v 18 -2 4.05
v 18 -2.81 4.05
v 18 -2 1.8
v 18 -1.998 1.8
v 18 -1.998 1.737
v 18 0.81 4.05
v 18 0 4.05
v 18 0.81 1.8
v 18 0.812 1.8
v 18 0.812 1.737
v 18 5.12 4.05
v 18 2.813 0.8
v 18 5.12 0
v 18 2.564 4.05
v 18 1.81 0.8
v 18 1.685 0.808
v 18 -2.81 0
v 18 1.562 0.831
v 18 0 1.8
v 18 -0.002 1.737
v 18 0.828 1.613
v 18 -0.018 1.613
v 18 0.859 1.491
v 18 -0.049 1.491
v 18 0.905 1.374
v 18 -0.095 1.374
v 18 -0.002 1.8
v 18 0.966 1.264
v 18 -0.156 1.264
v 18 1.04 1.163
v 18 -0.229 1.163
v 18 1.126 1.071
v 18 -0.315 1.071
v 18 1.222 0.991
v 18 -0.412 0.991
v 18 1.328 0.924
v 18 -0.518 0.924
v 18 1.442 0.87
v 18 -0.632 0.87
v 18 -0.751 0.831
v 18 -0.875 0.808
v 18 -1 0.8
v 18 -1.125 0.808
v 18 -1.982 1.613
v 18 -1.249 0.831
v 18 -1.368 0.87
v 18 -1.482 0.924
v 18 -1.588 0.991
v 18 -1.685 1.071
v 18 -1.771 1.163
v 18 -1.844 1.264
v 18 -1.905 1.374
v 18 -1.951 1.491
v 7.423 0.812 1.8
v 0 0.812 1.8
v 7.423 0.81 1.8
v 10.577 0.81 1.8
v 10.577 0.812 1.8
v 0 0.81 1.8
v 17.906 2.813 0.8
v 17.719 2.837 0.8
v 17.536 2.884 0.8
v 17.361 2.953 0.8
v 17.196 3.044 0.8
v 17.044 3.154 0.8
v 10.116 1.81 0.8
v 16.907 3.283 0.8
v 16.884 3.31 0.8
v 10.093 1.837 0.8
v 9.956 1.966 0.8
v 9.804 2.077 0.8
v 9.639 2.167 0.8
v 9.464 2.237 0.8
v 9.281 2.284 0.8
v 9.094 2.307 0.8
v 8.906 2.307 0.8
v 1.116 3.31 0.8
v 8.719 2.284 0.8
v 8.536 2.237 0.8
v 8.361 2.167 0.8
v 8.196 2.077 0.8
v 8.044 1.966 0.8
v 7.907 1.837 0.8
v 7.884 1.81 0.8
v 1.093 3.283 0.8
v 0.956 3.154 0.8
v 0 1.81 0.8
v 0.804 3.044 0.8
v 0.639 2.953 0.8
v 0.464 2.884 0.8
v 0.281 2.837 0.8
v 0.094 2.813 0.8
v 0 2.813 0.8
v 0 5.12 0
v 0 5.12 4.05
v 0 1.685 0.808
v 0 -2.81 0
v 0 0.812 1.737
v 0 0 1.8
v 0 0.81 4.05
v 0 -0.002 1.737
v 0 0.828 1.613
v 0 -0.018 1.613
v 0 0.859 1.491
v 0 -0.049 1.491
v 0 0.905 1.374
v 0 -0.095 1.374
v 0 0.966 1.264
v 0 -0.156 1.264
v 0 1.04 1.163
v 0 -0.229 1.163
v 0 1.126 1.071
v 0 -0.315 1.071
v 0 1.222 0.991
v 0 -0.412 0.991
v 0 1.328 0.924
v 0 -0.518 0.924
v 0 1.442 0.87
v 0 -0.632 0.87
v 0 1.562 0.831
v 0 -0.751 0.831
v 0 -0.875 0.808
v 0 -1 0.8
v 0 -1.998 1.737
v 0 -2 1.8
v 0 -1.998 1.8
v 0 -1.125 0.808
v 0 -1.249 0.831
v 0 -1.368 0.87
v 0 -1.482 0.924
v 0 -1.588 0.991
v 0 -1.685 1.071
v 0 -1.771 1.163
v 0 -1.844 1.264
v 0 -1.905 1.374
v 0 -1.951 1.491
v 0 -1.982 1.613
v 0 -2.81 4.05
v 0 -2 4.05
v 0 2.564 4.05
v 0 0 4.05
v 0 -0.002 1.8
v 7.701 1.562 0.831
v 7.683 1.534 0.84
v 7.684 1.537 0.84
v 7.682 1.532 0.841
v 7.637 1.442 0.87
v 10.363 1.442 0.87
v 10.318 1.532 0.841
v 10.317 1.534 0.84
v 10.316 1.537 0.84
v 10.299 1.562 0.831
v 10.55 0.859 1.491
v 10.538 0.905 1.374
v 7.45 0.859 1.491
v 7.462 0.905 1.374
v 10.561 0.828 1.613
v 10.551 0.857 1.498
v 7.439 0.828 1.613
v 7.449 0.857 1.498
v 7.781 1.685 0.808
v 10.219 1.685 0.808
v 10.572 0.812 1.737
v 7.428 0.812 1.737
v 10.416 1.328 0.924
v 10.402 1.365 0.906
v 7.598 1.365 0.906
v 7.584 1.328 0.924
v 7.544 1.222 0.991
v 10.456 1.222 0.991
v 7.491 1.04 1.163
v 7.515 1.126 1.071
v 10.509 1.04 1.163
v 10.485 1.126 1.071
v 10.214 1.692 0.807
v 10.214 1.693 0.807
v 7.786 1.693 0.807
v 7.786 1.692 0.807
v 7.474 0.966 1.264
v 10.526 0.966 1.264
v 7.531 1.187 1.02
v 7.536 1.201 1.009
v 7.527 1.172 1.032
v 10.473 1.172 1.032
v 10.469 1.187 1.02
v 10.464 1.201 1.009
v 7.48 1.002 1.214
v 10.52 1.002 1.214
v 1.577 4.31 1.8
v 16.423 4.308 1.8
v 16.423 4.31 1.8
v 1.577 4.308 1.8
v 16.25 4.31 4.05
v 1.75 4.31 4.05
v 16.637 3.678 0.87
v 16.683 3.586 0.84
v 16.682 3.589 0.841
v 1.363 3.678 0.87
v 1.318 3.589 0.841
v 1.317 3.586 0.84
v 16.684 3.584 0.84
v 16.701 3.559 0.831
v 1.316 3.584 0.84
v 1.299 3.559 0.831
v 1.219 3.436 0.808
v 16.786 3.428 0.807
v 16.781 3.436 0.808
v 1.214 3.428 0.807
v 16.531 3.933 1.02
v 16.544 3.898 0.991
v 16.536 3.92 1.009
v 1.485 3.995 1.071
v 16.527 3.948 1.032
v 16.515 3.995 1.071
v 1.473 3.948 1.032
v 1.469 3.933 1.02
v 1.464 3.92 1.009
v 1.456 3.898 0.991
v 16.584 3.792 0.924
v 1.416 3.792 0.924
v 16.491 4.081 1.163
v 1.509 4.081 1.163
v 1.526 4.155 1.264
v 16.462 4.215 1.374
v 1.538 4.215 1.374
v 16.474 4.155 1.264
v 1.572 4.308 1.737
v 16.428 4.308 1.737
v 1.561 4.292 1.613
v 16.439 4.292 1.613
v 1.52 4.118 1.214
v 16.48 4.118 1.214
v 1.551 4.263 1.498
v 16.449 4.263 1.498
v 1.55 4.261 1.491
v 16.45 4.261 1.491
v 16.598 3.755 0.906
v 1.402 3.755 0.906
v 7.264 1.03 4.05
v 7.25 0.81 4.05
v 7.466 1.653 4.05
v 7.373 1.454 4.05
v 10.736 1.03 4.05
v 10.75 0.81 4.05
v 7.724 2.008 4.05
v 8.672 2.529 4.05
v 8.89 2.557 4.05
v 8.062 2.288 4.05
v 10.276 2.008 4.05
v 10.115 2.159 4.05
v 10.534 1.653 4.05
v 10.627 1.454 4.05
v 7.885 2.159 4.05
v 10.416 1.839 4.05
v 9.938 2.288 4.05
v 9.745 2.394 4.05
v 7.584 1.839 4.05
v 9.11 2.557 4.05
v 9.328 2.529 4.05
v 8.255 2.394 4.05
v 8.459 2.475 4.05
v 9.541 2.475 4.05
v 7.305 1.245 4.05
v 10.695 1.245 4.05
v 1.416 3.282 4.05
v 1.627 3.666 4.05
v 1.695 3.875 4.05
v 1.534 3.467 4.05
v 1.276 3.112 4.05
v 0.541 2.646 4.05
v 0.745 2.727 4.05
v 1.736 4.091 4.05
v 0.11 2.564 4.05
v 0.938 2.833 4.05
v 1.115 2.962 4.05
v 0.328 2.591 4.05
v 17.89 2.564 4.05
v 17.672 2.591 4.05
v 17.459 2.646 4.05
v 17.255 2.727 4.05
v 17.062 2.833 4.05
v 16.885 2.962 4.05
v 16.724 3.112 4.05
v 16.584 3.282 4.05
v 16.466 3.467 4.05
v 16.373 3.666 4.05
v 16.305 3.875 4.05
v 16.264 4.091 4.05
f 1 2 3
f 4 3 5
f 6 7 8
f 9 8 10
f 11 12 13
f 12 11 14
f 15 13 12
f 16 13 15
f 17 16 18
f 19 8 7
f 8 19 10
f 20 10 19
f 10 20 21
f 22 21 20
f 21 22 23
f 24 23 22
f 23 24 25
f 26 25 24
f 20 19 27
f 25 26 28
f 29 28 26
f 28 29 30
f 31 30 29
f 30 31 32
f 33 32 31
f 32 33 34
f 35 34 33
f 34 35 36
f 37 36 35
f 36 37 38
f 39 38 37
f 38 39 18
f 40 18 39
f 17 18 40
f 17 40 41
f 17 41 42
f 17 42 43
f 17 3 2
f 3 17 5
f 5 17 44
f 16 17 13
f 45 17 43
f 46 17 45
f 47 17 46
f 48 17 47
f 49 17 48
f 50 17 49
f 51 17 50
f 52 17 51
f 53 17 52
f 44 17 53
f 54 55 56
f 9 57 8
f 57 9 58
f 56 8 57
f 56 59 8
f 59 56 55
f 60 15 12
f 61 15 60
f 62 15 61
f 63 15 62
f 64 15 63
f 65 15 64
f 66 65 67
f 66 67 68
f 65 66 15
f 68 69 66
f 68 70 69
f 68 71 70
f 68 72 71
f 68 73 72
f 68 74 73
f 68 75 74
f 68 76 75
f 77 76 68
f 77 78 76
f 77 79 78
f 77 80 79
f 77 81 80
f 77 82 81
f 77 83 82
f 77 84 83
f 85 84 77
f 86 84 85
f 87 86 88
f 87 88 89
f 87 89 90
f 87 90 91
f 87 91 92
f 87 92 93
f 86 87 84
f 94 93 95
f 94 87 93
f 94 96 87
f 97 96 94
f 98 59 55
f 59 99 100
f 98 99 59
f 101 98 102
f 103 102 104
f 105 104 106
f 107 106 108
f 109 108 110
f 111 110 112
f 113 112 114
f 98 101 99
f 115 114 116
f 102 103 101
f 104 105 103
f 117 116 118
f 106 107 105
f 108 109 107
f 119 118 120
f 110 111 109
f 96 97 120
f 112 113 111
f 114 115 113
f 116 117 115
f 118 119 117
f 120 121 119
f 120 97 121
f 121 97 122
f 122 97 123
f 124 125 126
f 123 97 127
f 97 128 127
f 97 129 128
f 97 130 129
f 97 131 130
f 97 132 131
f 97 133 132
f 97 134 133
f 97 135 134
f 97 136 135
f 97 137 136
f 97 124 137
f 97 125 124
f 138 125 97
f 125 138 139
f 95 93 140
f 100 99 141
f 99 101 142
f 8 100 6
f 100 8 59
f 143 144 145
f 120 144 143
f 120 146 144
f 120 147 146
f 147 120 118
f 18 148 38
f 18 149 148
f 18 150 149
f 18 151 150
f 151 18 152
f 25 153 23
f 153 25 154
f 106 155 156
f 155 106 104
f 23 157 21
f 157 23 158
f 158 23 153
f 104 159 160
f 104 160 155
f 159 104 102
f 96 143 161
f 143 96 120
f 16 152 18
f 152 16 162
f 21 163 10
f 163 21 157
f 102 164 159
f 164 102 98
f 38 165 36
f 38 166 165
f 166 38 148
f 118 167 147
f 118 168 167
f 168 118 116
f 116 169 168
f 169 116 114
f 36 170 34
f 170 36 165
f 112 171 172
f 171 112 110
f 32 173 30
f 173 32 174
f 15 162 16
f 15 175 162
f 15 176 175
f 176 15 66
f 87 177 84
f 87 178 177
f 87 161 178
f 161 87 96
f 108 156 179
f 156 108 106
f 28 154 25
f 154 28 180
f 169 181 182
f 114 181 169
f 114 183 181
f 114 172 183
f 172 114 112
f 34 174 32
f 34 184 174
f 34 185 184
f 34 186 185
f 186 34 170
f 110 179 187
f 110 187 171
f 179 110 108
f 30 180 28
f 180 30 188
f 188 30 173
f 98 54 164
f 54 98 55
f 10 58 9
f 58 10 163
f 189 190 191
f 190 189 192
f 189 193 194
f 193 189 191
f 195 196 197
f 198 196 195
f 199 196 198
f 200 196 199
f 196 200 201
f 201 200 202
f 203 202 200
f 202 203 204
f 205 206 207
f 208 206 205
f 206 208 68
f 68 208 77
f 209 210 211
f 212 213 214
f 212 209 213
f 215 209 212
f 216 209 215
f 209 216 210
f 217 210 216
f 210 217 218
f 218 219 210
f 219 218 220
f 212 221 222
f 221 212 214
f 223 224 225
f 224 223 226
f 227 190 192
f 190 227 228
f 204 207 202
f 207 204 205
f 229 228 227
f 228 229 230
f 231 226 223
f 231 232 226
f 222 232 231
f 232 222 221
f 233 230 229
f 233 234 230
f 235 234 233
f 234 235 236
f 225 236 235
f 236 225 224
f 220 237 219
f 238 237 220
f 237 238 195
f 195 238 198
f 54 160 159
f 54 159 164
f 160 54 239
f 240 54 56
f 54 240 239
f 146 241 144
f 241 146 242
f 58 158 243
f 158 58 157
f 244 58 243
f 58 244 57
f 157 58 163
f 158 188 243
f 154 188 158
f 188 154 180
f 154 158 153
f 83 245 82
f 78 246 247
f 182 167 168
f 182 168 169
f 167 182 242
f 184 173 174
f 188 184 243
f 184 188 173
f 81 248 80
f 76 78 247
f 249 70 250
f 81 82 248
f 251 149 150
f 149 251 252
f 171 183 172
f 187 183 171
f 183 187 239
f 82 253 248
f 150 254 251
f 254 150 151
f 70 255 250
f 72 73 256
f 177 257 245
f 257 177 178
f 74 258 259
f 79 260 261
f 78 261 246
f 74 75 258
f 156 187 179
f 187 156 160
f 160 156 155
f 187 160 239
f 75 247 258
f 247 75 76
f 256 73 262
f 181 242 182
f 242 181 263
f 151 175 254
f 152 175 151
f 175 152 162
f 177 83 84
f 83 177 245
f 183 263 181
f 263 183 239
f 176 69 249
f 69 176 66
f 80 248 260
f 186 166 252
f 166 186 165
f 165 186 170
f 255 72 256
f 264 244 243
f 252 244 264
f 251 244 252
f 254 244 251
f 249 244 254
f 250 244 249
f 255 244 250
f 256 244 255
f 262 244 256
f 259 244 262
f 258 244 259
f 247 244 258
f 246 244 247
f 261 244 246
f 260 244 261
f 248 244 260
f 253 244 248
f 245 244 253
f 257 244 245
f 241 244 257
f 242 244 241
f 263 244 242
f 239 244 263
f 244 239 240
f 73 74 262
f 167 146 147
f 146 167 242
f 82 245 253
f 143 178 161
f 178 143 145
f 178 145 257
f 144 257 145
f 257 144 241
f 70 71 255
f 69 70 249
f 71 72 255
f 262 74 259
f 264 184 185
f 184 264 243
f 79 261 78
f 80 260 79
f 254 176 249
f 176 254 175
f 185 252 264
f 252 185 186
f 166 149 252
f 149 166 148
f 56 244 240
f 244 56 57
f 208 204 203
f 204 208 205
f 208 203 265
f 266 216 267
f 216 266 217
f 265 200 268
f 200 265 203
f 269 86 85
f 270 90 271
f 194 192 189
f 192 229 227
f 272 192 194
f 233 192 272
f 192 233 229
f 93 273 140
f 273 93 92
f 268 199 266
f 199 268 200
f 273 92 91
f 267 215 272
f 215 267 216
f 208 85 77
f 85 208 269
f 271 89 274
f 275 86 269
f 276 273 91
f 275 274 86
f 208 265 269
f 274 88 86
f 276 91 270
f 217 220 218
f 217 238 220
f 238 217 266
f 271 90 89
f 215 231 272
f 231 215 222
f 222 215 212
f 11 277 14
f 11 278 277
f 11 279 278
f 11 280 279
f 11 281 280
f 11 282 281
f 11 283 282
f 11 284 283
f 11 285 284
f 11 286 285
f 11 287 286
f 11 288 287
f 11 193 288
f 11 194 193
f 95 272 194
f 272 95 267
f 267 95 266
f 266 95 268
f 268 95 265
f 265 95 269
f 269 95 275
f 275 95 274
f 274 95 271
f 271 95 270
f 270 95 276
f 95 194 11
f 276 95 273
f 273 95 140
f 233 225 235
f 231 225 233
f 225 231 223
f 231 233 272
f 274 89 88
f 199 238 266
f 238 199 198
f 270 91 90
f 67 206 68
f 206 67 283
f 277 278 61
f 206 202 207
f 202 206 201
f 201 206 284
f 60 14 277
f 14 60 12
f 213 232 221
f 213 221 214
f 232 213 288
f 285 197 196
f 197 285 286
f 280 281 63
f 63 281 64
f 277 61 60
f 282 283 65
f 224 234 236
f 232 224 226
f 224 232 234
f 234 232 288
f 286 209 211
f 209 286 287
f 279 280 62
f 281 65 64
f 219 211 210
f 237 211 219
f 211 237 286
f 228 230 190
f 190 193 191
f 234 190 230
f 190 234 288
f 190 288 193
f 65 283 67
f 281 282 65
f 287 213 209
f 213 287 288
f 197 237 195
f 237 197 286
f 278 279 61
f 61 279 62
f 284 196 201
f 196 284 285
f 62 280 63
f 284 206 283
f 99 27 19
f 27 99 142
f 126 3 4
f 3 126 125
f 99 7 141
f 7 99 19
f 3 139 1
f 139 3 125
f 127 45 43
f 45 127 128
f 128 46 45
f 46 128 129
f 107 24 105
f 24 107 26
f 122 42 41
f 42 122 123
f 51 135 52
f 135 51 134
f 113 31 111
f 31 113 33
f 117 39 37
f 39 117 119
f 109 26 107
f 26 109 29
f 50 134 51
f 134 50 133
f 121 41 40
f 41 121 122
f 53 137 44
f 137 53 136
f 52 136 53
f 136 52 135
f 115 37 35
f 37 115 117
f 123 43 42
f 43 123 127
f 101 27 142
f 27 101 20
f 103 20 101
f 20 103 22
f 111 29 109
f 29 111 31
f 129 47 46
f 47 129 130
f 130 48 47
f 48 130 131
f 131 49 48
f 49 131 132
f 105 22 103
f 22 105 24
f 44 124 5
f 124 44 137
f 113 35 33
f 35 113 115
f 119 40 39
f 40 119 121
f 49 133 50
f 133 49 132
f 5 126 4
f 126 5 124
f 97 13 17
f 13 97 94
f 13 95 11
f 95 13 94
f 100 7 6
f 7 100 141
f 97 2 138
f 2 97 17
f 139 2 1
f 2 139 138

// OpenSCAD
/* Filament Clip Creator for THE BEST Filament Clip
   by Lyl3

Able to create clips for 1.75 mm filament or 2.85 mm filament

This code is published at:
https://www.thingiverse.com/thing:3577297

V1.1 Enabled the Cura nozzle adjustment
V1.2 Added fillets at the bottom of the channels
V1.3 Fixed bug that was setting the height of the fillets in the straight channel based on the width of the grab channel instead of the width of the straight channel.
*/

$fn = 50 + 0;          
fudge = 0.0001 + 0;

/* [Parameters] */

//Enter the length of the clip (mm). The default length of 18 mm provides very good grabbing power. A shorter length increases the grabbing power but puts more stress on the filament.
clipLength = 18.0;           // [14:0.5:25]

// Enter the height of the channels (mm). The default height of 3.25 mm provides secure channels with minimal material. Increasing the height may provide an even lower risk of the filamant popping out but will use more material.
channel_height = 3.25;       // [3:0.05:6.5]

// Enter the thickness of the base (mm). The default of 0.8 mm is strong enough to hold together when clipping the filament. A thicker base will be even stronger but will use more material.
baseThickness = 0.8;         // [0.8:0.1:2]

//Enter the width of the walls (mm). The default of 0.8 mm is strong enough to hold together when clipping the filament. Thicker walls will be even stronger but will use more material.
wall_width = 0.8;             // [0.8:0.4:2.0]
wallWidth = (wall_width/0.4*0.4051); // For some reason Cura 3.6 treats a 0.4 mm nozzle as a 0.4051 mm nozzle, so the width needs to be adjusted for it to slice well. Slic3r doesn't care either way so this adjustment does no harm.

// Enter the width of the straight channel (mm). The default width of 2.0 is suitable for 1.75 mm filament and provides enough slack that the filament won't be forcing the wall apart. Don't reduce this below the default unless you have a very accurate printer.
straightChannelWidth = 2.0; // [1.8:0.05:3.5]

// Enter the width of the curved-path "grab" channel that contains the nubs (mm). The default width of 3.5 mm is suitable for 1.75 mm filament and provides enough space for the arced filament bent by the nubs. 
grabChannelWidth = 3.5;      // [2:0.1:6]

// Enter the top radius of the nubs in the curved-path "grab" channel (mm). The default radius of 1.75 mm is suitable for 1.75 mm filament and provides just enough space to push the filament into the channel if the width of the channel is left at the default value. Don't set this less than the bottom radius.
nubTopRadius = 1.75;         // [1:0.05:3]

// Enter the bottom radius of the nubs in the curved-path "grab" channel (mm). The default radius of 1.5 mm is suitable for 1.75 mm filament and provides enough of a bend in the filament to provide a good grip if the width of the channel is left at the default value. Don't set this greater than the top radius.
nubBottomRadius = 1.5;       // [1:0.05:3]

clipHeight = channel_height + baseThickness;
grabChannelSpace = grabChannelWidth - nubBottomRadius;

/*
Build the curved-path "grab" channel
*/

// The base
cube([clipLength,grabChannelWidth+2*wallWidth,baseThickness]);

// The walls
color ("green") cube([clipLength,wallWidth,clipHeight]);
color ("red") translate ([0,grabChannelWidth+wallWidth,0]) cube([clipLength,wallWidth,clipHeight]);

// The fillets
color ("purple") difference () {
translate([0,wallWidth,baseThickness])cube([clipLength,grabChannelSpace/2,grabChannelSpace/2]);
translate([0,grabChannelSpace/2+wallWidth,grabChannelSpace/2+baseThickness]) rotate([0,90,0]) cylinder(h=clipLength, d=grabChannelSpace);
}

color ("purple") difference () {
translate([0,grabChannelWidth+wallWidth-grabChannelSpace/2,baseThickness])cube([clipLength,grabChannelSpace/2,grabChannelSpace/2]);
translate([0,grabChannelWidth+wallWidth-grabChannelSpace/2,grabChannelSpace/2+baseThickness]) rotate([0,90,0]) cylinder(h=clipLength, d=grabChannelSpace);
}

// The nubs in the grab channel
color ("green") translate ([clipLength/2,wallWidth,0]) intersection () {
    translate ([0,0,baseThickness]) cylinder(h=clipHeight-baseThickness,r1=nubBottomRadius,r2=nubTopRadius);
    translate([-25,0,0]) cube (50);
}

color ("red") translate ([0,grabChannelWidth+wallWidth,0]) intersection () {
    translate ([0,0,baseThickness]) cylinder(h=clipHeight-baseThickness,r1=nubBottomRadius,r2=nubTopRadius);
    translate([0,-50,0]) cube (50);
}

color ("red") translate ([clipLength,grabChannelWidth+wallWidth,0]) intersection () {
    translate ([0,0,baseThickness]) cylinder(h=clipHeight-baseThickness,r1=nubBottomRadius,r2=nubTopRadius);
    translate([-50,-50,0]) cube (50);
}

/*
Build the straight channel
*/

// The base
translate ([0,-straightChannelWidth-wallWidth,0])
  cube([clipLength,straightChannelWidth+2*wallWidth,baseThickness]);

// The wall
color ("blue") translate ([0,-straightChannelWidth-wallWidth,0])
  cube([clipLength,wallWidth,clipHeight]);

// The fillets
color ("purple") difference () {
translate([0,-straightChannelWidth,baseThickness])cube([clipLength,straightChannelWidth,straightChannelWidth/2]);
translate([0,-straightChannelWidth/2,straightChannelWidth/2+baseThickness]) rotate([0,90,0]) cylinder(h=clipLength, d=straightChannelWidth);
}
